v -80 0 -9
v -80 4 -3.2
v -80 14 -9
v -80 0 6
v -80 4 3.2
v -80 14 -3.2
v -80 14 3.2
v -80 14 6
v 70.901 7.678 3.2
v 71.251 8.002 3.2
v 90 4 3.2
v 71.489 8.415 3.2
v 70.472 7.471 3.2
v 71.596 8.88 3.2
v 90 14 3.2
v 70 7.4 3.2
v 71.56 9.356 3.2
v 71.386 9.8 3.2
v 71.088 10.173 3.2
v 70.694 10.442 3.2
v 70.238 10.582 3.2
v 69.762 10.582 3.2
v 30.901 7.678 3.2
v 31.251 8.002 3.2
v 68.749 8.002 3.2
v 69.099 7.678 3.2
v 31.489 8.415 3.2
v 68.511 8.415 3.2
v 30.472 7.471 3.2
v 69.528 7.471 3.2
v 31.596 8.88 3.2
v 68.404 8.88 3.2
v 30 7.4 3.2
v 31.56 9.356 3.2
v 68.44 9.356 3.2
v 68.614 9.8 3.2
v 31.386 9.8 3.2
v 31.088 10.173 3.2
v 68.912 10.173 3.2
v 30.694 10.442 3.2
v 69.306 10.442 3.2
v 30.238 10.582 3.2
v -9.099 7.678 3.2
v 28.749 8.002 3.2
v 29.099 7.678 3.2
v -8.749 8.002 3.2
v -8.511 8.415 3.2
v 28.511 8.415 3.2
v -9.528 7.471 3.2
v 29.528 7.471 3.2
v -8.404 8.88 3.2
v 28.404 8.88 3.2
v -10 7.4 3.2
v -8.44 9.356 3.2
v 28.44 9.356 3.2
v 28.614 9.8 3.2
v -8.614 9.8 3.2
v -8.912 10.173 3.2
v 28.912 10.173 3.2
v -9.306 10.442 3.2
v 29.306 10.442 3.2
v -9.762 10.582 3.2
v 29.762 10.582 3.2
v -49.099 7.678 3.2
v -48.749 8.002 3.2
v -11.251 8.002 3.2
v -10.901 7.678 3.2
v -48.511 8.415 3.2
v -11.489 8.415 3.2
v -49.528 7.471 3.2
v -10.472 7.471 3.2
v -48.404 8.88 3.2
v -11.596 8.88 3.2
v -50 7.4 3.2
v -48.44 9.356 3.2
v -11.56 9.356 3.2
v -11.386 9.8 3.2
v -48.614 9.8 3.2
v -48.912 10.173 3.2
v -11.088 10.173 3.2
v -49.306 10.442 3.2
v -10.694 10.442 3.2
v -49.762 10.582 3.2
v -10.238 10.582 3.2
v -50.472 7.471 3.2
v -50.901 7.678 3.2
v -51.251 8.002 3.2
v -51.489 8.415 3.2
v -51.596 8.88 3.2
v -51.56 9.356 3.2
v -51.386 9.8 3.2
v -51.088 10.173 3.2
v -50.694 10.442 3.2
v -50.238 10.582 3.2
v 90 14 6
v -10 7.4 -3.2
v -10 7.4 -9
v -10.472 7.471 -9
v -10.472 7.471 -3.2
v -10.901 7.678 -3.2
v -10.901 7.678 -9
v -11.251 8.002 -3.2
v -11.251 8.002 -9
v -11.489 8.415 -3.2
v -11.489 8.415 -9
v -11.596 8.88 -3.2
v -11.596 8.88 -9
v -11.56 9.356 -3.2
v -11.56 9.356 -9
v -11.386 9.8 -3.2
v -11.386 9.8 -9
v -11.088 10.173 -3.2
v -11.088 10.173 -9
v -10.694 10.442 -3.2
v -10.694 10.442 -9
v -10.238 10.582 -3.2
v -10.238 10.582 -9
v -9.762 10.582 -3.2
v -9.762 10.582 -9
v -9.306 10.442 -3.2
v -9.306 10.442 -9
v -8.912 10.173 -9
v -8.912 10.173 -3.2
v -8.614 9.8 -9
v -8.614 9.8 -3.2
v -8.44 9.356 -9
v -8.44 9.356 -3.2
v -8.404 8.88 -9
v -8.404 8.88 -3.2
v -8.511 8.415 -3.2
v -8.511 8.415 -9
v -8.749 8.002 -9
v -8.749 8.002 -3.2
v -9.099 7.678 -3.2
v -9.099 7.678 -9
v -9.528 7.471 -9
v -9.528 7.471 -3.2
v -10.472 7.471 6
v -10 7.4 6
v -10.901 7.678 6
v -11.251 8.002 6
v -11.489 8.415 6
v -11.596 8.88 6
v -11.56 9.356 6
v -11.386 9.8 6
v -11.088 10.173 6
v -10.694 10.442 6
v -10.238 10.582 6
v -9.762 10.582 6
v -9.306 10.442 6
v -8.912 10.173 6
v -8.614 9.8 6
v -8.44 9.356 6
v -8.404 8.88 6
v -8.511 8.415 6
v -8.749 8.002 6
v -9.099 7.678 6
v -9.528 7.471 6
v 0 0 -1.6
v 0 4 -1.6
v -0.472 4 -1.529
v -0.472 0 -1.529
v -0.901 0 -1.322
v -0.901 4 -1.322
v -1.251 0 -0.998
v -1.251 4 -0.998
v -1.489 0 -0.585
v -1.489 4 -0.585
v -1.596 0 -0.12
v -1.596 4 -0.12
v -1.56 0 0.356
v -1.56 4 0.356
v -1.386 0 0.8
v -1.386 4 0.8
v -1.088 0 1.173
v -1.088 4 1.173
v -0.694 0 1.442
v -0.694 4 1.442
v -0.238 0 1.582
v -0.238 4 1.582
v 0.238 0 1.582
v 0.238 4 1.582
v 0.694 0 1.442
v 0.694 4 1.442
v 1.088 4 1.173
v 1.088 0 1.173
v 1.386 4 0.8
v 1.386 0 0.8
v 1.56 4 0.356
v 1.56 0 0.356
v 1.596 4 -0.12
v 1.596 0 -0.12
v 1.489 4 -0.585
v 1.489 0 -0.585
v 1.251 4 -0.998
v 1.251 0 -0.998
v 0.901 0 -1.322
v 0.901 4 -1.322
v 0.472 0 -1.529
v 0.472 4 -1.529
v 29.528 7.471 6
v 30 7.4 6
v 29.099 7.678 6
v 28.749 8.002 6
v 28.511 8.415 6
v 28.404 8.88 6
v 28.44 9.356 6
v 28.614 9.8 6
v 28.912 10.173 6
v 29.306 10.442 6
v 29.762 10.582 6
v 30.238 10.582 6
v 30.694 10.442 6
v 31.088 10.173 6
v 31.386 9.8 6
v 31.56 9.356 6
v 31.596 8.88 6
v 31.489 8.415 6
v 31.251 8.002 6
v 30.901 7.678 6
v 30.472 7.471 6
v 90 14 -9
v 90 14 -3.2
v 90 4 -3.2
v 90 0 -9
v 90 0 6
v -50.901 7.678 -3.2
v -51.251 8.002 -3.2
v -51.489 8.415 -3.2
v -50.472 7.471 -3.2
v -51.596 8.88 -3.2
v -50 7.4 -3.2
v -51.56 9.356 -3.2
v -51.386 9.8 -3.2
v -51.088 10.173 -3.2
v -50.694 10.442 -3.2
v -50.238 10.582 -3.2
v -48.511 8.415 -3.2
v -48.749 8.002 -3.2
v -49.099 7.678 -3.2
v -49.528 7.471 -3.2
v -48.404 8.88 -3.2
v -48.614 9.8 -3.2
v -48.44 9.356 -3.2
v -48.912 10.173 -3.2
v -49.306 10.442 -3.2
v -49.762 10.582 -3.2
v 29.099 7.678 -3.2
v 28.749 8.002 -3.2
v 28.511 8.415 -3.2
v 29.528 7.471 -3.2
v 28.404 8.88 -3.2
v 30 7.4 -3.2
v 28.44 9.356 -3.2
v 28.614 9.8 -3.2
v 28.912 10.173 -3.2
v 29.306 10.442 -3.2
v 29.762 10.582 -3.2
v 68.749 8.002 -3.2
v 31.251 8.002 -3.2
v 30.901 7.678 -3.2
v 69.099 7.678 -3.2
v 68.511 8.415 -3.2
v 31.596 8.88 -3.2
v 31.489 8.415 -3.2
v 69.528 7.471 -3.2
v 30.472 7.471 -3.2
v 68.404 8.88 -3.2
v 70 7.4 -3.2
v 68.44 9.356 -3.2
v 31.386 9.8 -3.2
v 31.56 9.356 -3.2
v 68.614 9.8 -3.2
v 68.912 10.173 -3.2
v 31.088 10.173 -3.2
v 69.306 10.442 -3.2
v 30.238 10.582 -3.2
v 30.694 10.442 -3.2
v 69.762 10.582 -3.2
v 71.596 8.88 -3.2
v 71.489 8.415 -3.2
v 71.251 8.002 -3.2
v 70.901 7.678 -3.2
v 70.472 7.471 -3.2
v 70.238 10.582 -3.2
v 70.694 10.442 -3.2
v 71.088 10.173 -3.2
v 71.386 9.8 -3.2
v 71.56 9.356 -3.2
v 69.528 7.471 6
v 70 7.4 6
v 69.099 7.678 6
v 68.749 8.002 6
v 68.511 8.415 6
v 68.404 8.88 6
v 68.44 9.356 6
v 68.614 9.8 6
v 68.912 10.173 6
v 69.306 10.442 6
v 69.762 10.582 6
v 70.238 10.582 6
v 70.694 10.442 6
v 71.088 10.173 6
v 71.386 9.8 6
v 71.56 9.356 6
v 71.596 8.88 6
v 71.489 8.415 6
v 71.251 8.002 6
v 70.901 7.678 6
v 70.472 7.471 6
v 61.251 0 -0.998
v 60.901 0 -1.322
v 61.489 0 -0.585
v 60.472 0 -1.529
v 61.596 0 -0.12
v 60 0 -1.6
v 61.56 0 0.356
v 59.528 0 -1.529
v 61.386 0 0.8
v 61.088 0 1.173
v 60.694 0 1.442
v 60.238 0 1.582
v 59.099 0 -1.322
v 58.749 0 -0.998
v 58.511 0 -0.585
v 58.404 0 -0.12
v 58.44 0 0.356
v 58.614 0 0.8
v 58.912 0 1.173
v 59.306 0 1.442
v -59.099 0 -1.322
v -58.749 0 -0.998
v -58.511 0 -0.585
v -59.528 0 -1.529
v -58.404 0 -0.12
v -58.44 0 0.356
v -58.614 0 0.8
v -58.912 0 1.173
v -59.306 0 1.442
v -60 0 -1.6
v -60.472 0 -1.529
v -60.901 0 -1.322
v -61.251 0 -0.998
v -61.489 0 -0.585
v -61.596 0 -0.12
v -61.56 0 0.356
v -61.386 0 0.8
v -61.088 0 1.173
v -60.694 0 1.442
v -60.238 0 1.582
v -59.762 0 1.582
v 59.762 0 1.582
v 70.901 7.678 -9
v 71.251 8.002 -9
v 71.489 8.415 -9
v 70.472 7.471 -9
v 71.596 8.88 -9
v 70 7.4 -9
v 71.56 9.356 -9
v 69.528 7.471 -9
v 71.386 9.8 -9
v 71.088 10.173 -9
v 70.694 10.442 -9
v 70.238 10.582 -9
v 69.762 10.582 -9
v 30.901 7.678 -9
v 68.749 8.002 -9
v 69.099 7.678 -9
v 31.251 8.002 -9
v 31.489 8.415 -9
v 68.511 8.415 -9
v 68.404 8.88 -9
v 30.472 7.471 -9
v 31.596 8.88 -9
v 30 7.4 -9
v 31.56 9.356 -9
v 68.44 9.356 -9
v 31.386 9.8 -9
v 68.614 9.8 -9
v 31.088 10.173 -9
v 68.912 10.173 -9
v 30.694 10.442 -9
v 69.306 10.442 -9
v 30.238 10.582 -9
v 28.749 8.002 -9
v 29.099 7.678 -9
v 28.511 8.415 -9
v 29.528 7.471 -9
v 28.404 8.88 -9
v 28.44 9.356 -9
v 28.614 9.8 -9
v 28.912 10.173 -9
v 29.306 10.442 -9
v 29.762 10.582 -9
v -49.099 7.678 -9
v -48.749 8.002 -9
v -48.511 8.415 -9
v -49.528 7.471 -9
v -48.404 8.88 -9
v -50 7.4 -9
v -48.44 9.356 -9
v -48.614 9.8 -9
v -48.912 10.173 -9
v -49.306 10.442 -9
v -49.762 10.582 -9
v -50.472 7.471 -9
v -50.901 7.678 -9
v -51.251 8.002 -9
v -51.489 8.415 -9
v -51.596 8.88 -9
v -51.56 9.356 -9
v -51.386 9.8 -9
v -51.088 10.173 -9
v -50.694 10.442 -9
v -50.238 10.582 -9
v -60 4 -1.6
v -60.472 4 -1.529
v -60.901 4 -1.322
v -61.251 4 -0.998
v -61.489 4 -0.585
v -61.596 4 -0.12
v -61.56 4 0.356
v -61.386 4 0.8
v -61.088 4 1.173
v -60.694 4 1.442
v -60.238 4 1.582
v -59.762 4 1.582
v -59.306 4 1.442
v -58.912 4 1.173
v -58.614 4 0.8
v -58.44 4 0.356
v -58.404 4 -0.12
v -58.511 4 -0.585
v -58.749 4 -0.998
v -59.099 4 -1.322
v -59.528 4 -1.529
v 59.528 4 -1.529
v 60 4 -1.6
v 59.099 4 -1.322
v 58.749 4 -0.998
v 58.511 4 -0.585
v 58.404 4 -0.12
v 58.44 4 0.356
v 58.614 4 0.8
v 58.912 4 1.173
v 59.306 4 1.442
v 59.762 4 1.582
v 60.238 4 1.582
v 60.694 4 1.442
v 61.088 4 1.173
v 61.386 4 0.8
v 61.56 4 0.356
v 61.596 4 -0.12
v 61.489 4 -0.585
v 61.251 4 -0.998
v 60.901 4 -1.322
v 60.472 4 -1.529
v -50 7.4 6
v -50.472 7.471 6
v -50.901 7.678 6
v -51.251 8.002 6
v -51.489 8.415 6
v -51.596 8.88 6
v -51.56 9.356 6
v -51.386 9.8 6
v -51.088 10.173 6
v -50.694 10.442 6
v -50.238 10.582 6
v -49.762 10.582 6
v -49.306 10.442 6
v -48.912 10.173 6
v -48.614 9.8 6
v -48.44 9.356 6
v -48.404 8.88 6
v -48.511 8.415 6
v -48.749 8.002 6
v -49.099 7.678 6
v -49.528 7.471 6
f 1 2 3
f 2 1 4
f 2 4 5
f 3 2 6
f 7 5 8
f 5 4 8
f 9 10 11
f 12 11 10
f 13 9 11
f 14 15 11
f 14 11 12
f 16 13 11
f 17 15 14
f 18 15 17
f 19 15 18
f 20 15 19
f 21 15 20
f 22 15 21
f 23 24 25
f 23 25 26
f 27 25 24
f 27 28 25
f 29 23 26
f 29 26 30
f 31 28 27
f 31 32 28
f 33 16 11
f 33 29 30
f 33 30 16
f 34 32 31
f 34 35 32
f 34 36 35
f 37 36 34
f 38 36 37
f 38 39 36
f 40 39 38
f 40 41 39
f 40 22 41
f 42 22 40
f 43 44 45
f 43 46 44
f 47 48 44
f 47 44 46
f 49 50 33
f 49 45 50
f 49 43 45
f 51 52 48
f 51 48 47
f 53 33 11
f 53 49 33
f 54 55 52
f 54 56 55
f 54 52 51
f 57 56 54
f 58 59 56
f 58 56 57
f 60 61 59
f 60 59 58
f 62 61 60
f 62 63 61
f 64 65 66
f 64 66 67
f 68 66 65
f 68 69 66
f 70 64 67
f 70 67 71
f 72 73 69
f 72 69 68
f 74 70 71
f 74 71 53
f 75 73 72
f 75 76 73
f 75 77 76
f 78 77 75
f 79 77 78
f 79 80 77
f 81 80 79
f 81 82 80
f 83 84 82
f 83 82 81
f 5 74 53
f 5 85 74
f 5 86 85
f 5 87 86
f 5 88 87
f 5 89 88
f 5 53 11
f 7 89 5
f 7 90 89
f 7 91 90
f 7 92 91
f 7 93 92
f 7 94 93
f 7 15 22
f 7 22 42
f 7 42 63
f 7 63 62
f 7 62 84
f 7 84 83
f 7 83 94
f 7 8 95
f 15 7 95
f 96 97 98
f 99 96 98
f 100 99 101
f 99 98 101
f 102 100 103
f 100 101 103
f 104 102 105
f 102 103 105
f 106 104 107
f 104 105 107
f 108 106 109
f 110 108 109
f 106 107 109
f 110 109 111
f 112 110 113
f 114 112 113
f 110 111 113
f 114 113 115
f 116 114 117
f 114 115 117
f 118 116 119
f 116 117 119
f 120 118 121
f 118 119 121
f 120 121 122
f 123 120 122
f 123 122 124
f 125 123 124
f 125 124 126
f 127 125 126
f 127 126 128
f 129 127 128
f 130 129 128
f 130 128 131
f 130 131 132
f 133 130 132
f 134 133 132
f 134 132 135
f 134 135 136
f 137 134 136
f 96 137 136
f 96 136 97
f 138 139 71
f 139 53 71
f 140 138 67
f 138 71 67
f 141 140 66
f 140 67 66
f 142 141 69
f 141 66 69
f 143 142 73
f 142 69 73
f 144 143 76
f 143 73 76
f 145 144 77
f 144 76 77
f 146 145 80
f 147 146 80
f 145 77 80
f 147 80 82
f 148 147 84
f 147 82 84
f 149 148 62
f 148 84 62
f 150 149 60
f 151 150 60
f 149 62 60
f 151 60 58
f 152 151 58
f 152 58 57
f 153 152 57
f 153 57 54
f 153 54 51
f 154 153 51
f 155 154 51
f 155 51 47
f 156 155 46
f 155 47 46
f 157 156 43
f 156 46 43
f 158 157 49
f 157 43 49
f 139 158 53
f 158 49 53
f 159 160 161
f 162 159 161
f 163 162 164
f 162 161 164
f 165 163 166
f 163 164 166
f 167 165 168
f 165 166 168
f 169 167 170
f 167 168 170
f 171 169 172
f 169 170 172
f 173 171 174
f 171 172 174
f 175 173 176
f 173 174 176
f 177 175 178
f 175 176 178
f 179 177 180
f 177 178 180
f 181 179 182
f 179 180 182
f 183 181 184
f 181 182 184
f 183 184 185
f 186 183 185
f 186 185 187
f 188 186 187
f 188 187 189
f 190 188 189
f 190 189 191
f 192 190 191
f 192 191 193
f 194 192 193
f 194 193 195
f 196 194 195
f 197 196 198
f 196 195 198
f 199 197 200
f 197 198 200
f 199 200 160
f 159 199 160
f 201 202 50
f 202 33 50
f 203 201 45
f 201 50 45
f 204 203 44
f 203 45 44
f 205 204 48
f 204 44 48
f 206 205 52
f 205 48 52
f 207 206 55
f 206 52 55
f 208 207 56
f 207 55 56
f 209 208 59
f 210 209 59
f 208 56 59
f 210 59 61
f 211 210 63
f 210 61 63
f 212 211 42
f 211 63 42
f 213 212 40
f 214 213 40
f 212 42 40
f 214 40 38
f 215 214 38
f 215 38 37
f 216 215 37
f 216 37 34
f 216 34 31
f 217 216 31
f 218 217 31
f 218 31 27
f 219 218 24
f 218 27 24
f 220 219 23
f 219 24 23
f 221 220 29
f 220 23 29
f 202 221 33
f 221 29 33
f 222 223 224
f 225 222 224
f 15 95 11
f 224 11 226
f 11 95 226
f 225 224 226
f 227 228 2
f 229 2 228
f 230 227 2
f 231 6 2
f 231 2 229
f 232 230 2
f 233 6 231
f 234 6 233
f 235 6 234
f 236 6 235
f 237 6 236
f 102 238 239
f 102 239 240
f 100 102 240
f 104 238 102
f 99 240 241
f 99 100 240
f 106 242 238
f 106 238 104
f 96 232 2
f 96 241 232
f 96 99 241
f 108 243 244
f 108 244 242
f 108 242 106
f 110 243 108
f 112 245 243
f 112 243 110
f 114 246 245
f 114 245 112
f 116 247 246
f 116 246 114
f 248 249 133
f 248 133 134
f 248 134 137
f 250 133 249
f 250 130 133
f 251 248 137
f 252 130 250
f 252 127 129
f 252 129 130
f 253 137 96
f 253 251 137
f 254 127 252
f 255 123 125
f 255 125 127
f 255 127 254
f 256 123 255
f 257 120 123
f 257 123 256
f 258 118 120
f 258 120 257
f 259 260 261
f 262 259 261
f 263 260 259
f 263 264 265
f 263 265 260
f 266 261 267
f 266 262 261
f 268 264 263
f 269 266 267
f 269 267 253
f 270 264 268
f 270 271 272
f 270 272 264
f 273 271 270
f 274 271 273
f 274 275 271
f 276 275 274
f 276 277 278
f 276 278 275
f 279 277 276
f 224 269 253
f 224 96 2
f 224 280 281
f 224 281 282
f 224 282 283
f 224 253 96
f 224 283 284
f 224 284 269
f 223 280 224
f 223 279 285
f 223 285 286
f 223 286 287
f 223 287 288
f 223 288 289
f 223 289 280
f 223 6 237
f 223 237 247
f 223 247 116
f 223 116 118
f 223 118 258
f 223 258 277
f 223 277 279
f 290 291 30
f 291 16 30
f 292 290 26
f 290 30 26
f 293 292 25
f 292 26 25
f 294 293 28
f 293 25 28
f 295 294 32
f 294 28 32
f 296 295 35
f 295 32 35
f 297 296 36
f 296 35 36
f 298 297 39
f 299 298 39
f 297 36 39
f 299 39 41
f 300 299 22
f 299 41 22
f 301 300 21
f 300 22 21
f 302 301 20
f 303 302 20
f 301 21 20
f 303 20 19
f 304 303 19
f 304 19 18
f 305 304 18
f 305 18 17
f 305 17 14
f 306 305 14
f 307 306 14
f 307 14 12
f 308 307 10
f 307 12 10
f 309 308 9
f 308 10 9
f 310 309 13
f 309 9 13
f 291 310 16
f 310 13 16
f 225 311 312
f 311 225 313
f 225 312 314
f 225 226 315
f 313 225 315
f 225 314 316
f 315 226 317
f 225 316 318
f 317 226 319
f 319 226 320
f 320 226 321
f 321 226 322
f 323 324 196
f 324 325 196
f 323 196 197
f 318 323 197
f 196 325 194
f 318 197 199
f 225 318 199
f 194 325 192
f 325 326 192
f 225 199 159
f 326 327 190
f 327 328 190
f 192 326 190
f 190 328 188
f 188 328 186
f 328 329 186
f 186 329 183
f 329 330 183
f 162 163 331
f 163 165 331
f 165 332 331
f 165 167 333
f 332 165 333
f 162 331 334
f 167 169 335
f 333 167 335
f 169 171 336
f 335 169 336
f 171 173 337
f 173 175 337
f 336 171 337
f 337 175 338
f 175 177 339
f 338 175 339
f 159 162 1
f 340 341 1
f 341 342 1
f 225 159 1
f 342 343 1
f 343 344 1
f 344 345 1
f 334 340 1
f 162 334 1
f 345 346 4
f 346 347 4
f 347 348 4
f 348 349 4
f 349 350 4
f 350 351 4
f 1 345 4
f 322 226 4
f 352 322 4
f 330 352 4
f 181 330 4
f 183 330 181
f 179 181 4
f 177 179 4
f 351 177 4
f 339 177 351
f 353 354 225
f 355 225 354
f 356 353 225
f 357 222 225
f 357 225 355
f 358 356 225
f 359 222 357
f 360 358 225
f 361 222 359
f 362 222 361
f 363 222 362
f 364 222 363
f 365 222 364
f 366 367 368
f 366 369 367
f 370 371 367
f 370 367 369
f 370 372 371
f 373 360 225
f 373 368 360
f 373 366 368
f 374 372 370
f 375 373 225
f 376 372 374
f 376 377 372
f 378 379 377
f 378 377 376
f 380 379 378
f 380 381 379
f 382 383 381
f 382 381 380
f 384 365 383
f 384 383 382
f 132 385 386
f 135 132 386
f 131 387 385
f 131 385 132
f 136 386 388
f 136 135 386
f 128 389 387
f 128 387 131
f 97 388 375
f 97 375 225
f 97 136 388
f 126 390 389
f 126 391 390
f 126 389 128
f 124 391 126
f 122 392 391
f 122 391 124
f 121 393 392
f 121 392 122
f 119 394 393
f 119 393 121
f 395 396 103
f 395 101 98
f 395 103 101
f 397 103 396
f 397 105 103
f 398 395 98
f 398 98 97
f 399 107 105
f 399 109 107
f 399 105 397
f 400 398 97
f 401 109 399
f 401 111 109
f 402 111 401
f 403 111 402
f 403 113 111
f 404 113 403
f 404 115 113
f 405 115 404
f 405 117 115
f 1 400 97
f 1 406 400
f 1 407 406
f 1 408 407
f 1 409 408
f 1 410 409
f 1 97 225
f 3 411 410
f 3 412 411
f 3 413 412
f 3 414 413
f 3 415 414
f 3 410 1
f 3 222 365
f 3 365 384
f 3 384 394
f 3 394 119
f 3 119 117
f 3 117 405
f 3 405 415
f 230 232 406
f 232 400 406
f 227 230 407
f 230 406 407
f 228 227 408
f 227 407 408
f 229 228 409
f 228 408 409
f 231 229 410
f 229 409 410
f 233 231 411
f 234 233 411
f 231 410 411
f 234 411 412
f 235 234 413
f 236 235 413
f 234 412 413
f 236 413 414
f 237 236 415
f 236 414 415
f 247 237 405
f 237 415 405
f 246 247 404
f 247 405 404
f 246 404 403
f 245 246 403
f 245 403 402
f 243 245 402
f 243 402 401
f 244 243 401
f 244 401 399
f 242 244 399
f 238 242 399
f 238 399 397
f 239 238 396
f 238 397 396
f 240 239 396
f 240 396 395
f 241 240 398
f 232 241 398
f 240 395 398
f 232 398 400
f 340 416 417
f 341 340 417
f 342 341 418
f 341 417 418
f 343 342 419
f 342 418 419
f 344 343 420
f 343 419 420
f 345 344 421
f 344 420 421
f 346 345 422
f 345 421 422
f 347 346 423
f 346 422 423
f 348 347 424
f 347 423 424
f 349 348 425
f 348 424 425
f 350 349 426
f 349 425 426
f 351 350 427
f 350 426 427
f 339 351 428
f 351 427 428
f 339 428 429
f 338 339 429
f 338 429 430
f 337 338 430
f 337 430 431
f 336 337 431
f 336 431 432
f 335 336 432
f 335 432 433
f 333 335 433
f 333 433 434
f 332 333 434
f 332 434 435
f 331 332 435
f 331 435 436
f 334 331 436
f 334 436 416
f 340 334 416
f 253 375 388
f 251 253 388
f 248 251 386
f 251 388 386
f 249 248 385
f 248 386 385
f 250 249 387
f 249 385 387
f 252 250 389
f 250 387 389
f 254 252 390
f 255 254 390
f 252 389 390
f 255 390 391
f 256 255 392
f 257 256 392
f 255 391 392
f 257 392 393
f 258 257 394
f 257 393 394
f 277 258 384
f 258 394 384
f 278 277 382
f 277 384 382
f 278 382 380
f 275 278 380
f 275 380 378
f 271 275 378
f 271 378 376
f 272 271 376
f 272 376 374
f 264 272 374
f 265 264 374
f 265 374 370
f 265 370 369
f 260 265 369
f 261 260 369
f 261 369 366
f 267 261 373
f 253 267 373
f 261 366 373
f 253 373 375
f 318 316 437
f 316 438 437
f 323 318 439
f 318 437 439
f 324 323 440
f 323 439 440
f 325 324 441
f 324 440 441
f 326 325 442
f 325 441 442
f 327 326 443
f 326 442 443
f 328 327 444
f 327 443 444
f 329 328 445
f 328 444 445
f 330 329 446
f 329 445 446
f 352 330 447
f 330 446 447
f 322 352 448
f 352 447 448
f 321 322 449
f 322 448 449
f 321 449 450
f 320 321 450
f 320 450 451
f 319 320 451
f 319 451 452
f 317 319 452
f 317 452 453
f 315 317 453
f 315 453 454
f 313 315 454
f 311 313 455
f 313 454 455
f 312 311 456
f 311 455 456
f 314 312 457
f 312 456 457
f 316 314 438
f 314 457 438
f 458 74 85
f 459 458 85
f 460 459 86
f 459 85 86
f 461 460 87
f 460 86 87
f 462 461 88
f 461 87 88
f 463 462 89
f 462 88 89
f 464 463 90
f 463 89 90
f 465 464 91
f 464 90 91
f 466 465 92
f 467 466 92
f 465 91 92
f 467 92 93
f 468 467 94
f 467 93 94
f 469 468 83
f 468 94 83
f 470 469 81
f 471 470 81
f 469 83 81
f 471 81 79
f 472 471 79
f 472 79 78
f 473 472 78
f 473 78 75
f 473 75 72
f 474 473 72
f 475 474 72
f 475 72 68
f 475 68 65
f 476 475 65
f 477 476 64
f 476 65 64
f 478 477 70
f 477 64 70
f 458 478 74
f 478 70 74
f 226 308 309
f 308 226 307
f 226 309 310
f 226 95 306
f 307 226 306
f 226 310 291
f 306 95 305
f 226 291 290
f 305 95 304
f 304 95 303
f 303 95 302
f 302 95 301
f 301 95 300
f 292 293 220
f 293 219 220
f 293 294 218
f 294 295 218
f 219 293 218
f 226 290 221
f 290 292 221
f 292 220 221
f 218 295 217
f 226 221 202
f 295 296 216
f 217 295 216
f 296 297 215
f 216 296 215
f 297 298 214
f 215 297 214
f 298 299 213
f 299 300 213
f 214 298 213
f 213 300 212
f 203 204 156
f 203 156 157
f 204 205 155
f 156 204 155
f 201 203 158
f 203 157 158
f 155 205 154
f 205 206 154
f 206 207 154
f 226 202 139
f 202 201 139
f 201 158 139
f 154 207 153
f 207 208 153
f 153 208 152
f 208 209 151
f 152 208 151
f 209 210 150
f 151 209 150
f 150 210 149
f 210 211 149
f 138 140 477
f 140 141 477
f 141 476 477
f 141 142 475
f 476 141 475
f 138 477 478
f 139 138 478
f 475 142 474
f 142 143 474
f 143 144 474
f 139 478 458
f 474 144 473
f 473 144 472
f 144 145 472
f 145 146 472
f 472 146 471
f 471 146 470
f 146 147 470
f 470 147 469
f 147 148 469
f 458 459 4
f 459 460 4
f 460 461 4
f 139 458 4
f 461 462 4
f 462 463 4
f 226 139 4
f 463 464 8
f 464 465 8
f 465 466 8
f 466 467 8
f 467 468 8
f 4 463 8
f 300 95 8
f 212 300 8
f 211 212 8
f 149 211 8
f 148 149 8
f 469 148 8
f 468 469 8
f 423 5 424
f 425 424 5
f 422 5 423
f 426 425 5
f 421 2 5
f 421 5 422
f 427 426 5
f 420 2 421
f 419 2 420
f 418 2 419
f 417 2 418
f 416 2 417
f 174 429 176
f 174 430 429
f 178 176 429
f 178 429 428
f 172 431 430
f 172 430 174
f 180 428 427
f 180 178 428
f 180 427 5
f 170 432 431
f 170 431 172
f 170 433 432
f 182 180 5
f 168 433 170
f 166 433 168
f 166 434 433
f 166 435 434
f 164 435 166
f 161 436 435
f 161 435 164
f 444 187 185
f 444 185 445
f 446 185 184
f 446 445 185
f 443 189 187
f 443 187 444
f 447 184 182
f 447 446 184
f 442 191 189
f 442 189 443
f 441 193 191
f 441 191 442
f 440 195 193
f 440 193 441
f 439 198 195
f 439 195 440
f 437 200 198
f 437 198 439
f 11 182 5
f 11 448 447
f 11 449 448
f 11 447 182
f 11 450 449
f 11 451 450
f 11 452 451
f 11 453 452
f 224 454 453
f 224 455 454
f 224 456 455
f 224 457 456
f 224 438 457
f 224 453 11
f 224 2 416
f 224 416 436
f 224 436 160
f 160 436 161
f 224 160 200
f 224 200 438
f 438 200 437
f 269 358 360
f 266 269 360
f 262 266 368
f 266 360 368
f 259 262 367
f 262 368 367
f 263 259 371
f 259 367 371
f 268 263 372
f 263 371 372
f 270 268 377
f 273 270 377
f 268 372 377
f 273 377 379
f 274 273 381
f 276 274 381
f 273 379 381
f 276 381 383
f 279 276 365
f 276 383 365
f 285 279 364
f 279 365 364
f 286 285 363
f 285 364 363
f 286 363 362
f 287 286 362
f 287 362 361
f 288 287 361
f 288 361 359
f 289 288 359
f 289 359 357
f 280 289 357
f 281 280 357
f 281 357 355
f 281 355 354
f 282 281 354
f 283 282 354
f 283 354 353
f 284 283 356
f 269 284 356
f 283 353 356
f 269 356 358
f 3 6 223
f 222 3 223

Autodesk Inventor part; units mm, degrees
ref_plane "YZ Plane" through (0, 0, 0) normal (1, 0, 0) x (0, 1, 0)
ref_plane "XZ Plane" through (0, 0, 0) normal (0, 1, 0) x (-1, 0, 0)
ref_plane "XY Plane" through (0, 0, 0) normal (0, 0, 1) x (1, 0, 0)
sketch "スケッチ1" plane through (0, 0, 0) normal (0, 1, 0) x (-1, 0, 0)
  line L0 (-90, -3) -> (90, -3)
  line L1 (90, -3) -> (90, 3)
  line L2 (90, 3) -> (-90, 3)
  line L3 (-90, 3) -> (-90, -3)
  line L4 (-90, -3) -> (90, 3) construction
  line L5 (90, -3) -> (-90, 3) construction
  point P0 (0, 0)
  dimension "d0" = 180
  dimension "d1" = 6
extrude "押し出し1" add sketch "スケッチ1" along normal blind 17
sketch "スケッチ2" plane through (0, 0, 0) normal (0, -1, 0) x (1, 0, 0)
  line L0 (-90, 3) -> (90, 3) projected
  line L1 (90, 3) -> (-80, 3)
  line L2 (-80, 3) -> (-80, 9)
  line L3 (-80, 9) -> (90, 9)
  line L4 (90, 9) -> (90, 3)
  line L5 (90, 3) -> (90, -3) projected
  line L6 (90, -3) -> (-80, -3)
  line L7 (-80, -3) -> (-80, -6)
  line L8 (-80, -6) -> (90, -6)
  line L9 (90, -6) -> (90, -3)
  point P0 (0, 0)
  dimension "d4" = 170
  dimension "d5" = 6
  dimension "d6" = 170
  dimension "d7" = 3
extrude "押し出し2" add sketch "スケッチ2" against normal blind 14
sketch "スケッチ3" plane through (0, 17, 0) normal (0, 1, 0) x (1, 0, 0)
  line L0 (-90, 3) -> (-90, -3) projected
  line L1 (90, -3) -> (90, 3) projected
  line L2 (-90, 3) -> (90, 3)
  line L3 (90, 3) -> (90, -3)
  line L4 (90, -3) -> (-90, -3)
  line L5 (-90, -3) -> (-90, 3)
  point P0 (0, 0)
extrude "押し出し3" cut sketch "スケッチ3" against normal blind 13
sketch "スケッチ4" plane through (0, 4, 0) normal (0, 1, 0) x (1, 0, 0)
  line L0 (-90, -3) -> (-90, 3) projected
  line L1 (-80, 6) -> (-80, 3) projected
  line L2 (-90, -3) -> (-80, -3)
  line L3 (-80, -3) -> (-80, 3)
  line L4 (-80, 3) -> (-90, 3)
  line L5 (-90, 3) -> (-90, -3)
  point P0 (0, 0)
extrude "押し出し4" cut sketch "スケッチ4" against normal blind 13
sketch "スケッチ5" plane through (0, 14, 0) normal (0, 1, 0) x (1, 0, 0)
  line L0 (97.0492, -3.2) -> (-97.0492, -3.2)
  line L1 (-97.0492, -3.2) -> (-97.0492, 3.2)
  line L2 (-97.0492, 3.2) -> (97.0492, 3.2)
  line L3 (97.0492, 3.2) -> (97.0492, -3.2)
  line L4 (97.0492, -3.2) -> (-97.0492, 3.2) construction
  line L5 (-97.0492, -3.2) -> (97.0492, 3.2) construction
  point P0 (0, 0)
  dimension "d14" = 6.4
extrude "押し出し5" cut sketch "スケッチ5" against normal blind 10
sketch "スケッチ6" plane through (-80, 0, 9) normal (0, 0, 1) x (1, 0, 0)
  line L0 (0, 14) -> (170, 14) projected
  line L1 (170, 0) -> (170, 14) projected
  point P0 (80, 0)
  point P1 (150, 9)
  point P2 (110, 9)
  point P3 (70, 9)
  point P4 (30, 9)
  dimension "d17" = 5
  dimension "d18" = 20
  dimension "d19" = 40
  dimension "d20" = 5
  dimension "d21" = 40
  dimension "d22" = 40
hole "穴1" at (70, 9, 9) at (30, 9, 9) at (-10, 9, 9) at (-50, 9, 9) direction (0, 0, -1) diameter 3.2 end through all
sketch "スケッチ7" plane through (0, 0, 0) normal (0, -1, 0) x (1, 0, 0)
  line L0 (-80, -6) -> (90, -6) projected
  line L1 (90, -6) -> (90, 9) projected
  line L2 (-80, -3.2) -> (90, -3.2) projected
  point P0 (0, 0)
  point P1 (60, 0)
  point P2 (0, 0)
  point P3 (-60, 0)
  dimension "d30" = 6
  dimension "d31" = 30
  dimension "d32" = 60
hole "穴2" at (60, 0, 0) at (0, 0, 0) at (-60, 0, 0) direction (0, 1, 0) diameter 3.2 end through all
sketch "スケッチ8" plane through (90, 0, -6) normal (0, 0, -1) x (-1, 0, 0)
  line L0 (170, 0) -> (170, 14) projected
  line L1 (0, 0) -> (170, 0)
  line L2 (170, 0) -> (170, 14)
  line L3 (170, 14) -> (0, 14)
  line L4 (0, 14) -> (0, 0)
  point P0 (90, 0)
extrude "押し出し6" add sketch "スケッチ8" along normal blind 3
sketch "スケッチ10" plane through (-80, 0, 9) normal (0, 0, 1) x (1, 0, 0)
  circle A0 centre (150, 9) radius 1.6 projected
  circle A1 centre (110, 9) radius 1.6 projected
  circle A2 centre (70, 9) radius 1.6 projected
  circle A3 centre (30, 9) radius 1.6 projected
  point P0 (80, 0)
hole "穴3" at (70, 9, 9) at (30, 9, 9) at (-10, 9, 9) at (-50, 9, 9) direction (0, 0, -1) diameter 3.2 end through all
sketch "スケッチ11" plane through (0, 14, 0) normal (0, 1, 0) x (1, 0, 0)
  line L0 (-80, -9) -> (90, -9) projected
  line L1 (-80, -9) -> (90, -9)
  line L2 (90, -9) -> (90, -6)
  line L3 (90, -6) -> (-80, -6)
  line L4 (-80, -6) -> (-80, -9)
  point P0 (0, 0)
  dimension "d49" = 170
  dimension "d50" = 3
extrude "押し出し7" cut sketch "スケッチ11" against normal blind 40
properties part number "lock2"
